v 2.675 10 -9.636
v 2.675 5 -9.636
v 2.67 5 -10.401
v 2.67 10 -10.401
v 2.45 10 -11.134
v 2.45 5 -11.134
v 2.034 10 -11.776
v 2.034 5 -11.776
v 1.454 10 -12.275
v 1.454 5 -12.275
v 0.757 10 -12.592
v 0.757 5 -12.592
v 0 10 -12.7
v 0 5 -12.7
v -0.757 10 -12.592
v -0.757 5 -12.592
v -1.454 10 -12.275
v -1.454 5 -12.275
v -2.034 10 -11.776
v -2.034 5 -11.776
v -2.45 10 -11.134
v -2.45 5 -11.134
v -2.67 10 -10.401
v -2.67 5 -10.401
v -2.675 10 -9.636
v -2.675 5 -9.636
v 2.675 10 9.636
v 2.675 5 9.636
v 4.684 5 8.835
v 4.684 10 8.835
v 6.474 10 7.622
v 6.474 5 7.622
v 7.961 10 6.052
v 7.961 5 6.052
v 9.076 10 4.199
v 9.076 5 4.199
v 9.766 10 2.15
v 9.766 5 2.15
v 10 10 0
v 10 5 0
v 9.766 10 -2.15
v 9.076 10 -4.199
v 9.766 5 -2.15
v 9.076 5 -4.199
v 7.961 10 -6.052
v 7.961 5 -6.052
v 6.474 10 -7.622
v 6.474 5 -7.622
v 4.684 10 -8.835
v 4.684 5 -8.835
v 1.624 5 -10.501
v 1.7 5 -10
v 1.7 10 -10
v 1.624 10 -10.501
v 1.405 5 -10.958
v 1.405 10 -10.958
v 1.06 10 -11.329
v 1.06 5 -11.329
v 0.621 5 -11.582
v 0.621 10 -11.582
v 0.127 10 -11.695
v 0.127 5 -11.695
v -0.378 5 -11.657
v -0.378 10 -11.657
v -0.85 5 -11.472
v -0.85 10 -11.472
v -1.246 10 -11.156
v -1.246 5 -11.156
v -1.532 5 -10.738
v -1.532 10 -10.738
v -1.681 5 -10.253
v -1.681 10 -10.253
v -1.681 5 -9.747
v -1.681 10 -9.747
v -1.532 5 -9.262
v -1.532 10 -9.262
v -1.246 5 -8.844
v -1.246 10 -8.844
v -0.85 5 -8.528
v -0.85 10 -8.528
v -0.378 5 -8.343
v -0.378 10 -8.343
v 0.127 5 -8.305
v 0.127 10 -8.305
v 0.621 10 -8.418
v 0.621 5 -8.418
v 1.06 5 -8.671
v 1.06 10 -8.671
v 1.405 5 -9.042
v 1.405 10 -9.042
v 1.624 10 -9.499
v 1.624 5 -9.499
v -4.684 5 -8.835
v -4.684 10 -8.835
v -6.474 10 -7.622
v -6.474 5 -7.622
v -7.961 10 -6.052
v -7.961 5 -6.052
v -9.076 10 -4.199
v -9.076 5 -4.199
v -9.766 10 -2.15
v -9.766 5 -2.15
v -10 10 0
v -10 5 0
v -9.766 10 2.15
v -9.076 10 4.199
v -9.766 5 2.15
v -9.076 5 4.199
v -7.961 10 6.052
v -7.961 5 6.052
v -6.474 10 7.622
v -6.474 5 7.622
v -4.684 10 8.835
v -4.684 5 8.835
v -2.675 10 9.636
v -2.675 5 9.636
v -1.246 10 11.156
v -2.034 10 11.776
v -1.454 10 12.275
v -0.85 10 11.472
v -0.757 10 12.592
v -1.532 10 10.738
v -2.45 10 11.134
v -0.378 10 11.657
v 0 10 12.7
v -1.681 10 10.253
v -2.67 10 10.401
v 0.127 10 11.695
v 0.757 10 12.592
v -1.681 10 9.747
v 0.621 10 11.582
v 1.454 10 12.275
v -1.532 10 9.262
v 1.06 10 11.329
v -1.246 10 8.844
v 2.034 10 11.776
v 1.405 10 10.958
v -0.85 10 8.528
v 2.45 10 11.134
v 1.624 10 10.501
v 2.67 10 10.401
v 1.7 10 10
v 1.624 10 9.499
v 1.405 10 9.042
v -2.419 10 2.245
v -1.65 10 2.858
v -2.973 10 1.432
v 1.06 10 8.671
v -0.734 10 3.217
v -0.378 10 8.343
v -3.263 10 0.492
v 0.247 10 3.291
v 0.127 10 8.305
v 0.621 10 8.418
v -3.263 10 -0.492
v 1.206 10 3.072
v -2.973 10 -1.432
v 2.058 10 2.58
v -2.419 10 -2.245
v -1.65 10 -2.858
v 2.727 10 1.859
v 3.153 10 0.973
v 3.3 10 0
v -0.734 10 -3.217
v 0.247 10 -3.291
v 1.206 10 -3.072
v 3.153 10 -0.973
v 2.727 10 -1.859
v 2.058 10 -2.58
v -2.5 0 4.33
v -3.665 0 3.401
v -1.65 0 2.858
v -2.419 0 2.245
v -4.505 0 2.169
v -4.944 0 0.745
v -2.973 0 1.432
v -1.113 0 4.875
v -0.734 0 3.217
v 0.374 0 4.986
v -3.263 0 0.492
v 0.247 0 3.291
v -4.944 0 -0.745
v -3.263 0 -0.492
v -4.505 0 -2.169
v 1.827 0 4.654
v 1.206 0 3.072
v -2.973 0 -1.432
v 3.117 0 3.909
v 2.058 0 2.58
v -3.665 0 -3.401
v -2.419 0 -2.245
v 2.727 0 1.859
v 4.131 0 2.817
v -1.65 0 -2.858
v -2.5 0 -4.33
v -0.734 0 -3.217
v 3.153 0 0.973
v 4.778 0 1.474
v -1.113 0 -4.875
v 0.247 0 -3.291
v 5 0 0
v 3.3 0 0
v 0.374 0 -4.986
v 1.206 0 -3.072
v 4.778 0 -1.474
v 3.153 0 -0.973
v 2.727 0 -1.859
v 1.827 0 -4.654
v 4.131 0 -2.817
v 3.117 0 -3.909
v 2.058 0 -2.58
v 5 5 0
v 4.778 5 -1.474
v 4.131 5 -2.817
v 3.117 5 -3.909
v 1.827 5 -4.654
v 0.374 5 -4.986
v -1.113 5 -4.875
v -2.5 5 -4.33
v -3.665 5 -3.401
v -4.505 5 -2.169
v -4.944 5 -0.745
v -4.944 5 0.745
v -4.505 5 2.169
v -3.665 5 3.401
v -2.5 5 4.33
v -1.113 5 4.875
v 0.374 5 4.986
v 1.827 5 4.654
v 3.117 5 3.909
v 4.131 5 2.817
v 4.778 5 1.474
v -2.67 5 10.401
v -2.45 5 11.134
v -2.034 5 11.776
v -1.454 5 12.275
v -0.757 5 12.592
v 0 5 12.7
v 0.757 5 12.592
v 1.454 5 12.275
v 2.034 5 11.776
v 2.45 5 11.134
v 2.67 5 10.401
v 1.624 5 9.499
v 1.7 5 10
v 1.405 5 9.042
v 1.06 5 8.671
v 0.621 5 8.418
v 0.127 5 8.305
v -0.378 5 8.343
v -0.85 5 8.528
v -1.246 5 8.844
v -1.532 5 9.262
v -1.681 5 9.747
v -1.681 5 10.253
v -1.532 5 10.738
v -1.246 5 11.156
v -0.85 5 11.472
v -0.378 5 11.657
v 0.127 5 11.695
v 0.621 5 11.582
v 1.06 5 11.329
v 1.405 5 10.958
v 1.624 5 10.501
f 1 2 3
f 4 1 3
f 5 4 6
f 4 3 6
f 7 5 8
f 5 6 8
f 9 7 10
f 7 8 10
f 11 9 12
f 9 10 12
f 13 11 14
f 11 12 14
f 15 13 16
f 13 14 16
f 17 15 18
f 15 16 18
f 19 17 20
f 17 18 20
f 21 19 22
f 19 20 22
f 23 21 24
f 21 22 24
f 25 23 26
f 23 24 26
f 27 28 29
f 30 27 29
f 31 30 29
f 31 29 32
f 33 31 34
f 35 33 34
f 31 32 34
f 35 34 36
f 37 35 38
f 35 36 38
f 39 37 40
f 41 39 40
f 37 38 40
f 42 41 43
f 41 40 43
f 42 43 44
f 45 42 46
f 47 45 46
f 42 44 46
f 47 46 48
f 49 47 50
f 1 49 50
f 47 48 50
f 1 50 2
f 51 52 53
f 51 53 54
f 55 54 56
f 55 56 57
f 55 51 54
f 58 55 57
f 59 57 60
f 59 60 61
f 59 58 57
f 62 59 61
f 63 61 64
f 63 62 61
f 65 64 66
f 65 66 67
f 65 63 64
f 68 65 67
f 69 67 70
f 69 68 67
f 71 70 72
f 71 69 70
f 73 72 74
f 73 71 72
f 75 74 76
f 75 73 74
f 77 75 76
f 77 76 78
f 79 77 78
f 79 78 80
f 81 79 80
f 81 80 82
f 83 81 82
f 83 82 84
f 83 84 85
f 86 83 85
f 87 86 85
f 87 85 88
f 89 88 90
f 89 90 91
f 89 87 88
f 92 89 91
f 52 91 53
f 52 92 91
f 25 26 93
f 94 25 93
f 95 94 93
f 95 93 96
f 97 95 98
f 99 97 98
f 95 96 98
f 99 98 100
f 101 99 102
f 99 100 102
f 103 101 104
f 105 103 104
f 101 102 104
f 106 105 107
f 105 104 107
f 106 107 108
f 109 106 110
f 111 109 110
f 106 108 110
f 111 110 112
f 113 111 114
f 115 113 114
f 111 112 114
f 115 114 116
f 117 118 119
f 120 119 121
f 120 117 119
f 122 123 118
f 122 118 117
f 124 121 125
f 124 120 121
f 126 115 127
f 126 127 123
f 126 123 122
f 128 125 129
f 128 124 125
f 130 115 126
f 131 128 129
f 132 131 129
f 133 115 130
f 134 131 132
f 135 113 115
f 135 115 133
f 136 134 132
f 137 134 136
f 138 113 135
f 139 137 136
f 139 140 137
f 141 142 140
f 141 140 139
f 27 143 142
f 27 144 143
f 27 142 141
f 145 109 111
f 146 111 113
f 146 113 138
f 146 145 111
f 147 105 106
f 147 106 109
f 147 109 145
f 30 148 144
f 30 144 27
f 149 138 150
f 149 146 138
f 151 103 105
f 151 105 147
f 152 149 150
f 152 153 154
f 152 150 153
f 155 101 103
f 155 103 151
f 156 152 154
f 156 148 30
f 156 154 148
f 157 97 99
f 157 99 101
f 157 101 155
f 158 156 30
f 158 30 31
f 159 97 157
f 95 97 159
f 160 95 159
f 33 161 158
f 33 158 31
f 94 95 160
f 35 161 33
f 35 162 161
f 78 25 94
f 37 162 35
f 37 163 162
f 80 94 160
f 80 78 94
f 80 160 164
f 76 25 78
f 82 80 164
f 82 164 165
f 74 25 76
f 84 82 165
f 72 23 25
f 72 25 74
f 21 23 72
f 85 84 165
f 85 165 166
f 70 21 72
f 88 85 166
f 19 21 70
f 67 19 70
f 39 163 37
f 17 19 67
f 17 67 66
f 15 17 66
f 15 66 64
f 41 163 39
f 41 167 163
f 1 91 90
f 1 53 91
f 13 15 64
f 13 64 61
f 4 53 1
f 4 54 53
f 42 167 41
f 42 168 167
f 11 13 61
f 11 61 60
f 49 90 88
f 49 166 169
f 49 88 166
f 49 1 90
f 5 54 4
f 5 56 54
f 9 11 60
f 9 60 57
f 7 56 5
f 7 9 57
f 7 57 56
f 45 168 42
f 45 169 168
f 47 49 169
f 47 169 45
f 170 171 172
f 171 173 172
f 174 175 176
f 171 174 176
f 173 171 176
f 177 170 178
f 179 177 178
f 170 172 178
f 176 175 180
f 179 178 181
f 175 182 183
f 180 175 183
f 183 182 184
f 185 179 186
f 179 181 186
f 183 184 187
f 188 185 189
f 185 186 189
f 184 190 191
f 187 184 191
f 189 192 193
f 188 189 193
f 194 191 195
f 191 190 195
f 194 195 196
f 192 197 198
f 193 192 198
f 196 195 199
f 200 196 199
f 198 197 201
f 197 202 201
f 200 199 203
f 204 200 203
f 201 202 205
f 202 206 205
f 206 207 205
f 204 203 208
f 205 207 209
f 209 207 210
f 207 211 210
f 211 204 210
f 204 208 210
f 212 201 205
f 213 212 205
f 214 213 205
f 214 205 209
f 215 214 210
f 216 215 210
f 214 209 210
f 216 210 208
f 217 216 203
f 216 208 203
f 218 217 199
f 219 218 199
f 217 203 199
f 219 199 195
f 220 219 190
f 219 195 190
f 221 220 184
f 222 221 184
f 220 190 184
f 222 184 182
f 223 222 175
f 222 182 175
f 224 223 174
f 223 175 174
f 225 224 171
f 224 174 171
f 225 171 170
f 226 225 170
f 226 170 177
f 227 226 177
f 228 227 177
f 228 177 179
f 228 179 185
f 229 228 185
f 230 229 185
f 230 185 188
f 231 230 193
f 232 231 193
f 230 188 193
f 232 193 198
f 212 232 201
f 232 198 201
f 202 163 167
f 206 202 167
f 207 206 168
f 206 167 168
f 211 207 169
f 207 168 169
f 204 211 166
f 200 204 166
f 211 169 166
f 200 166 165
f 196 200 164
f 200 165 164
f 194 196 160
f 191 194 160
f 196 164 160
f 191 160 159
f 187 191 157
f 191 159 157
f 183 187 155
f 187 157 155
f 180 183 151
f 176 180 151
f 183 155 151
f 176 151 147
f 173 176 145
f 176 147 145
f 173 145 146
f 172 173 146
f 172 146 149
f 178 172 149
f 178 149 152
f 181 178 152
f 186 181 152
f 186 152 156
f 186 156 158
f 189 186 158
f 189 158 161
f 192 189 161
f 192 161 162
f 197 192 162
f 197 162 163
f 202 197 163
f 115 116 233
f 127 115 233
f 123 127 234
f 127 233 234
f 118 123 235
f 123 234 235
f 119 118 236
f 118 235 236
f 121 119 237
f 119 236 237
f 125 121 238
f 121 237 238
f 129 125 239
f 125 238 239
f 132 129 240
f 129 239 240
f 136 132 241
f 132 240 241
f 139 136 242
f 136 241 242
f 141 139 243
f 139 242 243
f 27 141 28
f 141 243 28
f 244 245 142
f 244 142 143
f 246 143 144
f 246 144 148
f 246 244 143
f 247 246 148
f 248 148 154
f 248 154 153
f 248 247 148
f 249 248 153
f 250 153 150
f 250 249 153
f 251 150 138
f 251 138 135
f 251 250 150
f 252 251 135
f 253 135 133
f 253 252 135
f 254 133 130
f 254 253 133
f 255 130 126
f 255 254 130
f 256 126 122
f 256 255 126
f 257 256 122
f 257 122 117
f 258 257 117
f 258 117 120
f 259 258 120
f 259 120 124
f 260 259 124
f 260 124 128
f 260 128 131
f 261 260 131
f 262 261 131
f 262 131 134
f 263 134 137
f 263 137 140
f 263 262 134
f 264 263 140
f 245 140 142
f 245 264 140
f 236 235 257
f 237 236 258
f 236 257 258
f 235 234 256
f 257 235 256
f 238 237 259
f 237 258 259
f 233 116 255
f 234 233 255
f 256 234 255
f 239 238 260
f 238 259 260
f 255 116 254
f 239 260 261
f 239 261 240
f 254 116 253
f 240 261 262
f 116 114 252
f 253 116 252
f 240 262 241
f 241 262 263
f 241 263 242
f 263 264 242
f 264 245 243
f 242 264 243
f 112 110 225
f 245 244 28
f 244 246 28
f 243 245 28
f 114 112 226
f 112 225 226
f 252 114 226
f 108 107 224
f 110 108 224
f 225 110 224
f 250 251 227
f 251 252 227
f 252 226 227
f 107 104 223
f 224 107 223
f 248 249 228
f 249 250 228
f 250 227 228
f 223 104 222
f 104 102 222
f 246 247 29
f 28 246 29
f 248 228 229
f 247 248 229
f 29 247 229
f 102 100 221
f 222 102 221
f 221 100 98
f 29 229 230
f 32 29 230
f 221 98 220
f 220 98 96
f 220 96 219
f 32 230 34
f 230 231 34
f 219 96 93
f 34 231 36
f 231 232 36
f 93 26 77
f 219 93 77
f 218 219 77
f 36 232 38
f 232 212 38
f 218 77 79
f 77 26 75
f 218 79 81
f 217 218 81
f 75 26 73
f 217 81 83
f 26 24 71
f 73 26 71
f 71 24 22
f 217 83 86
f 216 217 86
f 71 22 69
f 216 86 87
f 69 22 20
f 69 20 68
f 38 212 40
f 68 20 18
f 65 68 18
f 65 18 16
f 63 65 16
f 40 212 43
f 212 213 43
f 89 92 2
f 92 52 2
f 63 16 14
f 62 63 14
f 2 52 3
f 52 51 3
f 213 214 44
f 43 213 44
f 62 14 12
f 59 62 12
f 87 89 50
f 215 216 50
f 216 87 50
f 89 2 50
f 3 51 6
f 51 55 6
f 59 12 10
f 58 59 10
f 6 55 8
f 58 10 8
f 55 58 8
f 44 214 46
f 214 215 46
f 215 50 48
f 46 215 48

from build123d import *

# Parameters (mm, degrees)
CROQUIS1_R                   = 5
SALIENTE_EXTRUIR1_DEPTH      = 5
CROQUIS2_R                   = 1.7
SALIENTE_EXTRUIR2_DEPTH      = 5
TALADRO_DE_MARGEN_PARA_M61_D = 6.6


with BuildPart() as part:
    # Croquis1 → Saliente-Extruir1 (new body)
    with BuildSketch(Plane(origin=(0, 0, 0), x_dir=(1, 0, 0), z_dir=(0, 1, 0))):
        Circle(CROQUIS1_R)
    extrude(amount=SALIENTE_EXTRUIR1_DEPTH)

    # Croquis2 → Saliente-Extruir2 (add)
    with BuildSketch(Plane(origin=(0, 5, 0), x_dir=(1, 0, 0), z_dir=(0, 1, 0))):
        with BuildLine():
            ThreePointArc((-2.675283116, 9.6355), (-10, 0), (-2.675283116, -9.6355))
            ThreePointArc((-2.675283116, -9.6355), (0, -12.7), (2.675283116, -9.6355))
            ThreePointArc((2.675283116, -9.6355), (10, 0), (2.675283116, 9.6355))
            ThreePointArc((2.675283116, 9.6355), (0, 12.7), (-2.675283116, 9.6355))
        make_face()
        with Locations((0, 10)):
            Circle(CROQUIS2_R, mode=Mode.SUBTRACT)
        with Locations((0, -10)):
            Circle(CROQUIS2_R, mode=Mode.SUBTRACT)
    extrude(amount=SALIENTE_EXTRUIR2_DEPTH)

    # Taladro de margen para M61 (through all)
    with Locations(Plane(origin=(0, 0, 0), x_dir=(-1, 0, 0), z_dir=(0, -1, 0))):
        with Locations((0, 0)):
            Hole(TALADRO_DE_MARGEN_PARA_M61_D / 2)


solid = part.part
